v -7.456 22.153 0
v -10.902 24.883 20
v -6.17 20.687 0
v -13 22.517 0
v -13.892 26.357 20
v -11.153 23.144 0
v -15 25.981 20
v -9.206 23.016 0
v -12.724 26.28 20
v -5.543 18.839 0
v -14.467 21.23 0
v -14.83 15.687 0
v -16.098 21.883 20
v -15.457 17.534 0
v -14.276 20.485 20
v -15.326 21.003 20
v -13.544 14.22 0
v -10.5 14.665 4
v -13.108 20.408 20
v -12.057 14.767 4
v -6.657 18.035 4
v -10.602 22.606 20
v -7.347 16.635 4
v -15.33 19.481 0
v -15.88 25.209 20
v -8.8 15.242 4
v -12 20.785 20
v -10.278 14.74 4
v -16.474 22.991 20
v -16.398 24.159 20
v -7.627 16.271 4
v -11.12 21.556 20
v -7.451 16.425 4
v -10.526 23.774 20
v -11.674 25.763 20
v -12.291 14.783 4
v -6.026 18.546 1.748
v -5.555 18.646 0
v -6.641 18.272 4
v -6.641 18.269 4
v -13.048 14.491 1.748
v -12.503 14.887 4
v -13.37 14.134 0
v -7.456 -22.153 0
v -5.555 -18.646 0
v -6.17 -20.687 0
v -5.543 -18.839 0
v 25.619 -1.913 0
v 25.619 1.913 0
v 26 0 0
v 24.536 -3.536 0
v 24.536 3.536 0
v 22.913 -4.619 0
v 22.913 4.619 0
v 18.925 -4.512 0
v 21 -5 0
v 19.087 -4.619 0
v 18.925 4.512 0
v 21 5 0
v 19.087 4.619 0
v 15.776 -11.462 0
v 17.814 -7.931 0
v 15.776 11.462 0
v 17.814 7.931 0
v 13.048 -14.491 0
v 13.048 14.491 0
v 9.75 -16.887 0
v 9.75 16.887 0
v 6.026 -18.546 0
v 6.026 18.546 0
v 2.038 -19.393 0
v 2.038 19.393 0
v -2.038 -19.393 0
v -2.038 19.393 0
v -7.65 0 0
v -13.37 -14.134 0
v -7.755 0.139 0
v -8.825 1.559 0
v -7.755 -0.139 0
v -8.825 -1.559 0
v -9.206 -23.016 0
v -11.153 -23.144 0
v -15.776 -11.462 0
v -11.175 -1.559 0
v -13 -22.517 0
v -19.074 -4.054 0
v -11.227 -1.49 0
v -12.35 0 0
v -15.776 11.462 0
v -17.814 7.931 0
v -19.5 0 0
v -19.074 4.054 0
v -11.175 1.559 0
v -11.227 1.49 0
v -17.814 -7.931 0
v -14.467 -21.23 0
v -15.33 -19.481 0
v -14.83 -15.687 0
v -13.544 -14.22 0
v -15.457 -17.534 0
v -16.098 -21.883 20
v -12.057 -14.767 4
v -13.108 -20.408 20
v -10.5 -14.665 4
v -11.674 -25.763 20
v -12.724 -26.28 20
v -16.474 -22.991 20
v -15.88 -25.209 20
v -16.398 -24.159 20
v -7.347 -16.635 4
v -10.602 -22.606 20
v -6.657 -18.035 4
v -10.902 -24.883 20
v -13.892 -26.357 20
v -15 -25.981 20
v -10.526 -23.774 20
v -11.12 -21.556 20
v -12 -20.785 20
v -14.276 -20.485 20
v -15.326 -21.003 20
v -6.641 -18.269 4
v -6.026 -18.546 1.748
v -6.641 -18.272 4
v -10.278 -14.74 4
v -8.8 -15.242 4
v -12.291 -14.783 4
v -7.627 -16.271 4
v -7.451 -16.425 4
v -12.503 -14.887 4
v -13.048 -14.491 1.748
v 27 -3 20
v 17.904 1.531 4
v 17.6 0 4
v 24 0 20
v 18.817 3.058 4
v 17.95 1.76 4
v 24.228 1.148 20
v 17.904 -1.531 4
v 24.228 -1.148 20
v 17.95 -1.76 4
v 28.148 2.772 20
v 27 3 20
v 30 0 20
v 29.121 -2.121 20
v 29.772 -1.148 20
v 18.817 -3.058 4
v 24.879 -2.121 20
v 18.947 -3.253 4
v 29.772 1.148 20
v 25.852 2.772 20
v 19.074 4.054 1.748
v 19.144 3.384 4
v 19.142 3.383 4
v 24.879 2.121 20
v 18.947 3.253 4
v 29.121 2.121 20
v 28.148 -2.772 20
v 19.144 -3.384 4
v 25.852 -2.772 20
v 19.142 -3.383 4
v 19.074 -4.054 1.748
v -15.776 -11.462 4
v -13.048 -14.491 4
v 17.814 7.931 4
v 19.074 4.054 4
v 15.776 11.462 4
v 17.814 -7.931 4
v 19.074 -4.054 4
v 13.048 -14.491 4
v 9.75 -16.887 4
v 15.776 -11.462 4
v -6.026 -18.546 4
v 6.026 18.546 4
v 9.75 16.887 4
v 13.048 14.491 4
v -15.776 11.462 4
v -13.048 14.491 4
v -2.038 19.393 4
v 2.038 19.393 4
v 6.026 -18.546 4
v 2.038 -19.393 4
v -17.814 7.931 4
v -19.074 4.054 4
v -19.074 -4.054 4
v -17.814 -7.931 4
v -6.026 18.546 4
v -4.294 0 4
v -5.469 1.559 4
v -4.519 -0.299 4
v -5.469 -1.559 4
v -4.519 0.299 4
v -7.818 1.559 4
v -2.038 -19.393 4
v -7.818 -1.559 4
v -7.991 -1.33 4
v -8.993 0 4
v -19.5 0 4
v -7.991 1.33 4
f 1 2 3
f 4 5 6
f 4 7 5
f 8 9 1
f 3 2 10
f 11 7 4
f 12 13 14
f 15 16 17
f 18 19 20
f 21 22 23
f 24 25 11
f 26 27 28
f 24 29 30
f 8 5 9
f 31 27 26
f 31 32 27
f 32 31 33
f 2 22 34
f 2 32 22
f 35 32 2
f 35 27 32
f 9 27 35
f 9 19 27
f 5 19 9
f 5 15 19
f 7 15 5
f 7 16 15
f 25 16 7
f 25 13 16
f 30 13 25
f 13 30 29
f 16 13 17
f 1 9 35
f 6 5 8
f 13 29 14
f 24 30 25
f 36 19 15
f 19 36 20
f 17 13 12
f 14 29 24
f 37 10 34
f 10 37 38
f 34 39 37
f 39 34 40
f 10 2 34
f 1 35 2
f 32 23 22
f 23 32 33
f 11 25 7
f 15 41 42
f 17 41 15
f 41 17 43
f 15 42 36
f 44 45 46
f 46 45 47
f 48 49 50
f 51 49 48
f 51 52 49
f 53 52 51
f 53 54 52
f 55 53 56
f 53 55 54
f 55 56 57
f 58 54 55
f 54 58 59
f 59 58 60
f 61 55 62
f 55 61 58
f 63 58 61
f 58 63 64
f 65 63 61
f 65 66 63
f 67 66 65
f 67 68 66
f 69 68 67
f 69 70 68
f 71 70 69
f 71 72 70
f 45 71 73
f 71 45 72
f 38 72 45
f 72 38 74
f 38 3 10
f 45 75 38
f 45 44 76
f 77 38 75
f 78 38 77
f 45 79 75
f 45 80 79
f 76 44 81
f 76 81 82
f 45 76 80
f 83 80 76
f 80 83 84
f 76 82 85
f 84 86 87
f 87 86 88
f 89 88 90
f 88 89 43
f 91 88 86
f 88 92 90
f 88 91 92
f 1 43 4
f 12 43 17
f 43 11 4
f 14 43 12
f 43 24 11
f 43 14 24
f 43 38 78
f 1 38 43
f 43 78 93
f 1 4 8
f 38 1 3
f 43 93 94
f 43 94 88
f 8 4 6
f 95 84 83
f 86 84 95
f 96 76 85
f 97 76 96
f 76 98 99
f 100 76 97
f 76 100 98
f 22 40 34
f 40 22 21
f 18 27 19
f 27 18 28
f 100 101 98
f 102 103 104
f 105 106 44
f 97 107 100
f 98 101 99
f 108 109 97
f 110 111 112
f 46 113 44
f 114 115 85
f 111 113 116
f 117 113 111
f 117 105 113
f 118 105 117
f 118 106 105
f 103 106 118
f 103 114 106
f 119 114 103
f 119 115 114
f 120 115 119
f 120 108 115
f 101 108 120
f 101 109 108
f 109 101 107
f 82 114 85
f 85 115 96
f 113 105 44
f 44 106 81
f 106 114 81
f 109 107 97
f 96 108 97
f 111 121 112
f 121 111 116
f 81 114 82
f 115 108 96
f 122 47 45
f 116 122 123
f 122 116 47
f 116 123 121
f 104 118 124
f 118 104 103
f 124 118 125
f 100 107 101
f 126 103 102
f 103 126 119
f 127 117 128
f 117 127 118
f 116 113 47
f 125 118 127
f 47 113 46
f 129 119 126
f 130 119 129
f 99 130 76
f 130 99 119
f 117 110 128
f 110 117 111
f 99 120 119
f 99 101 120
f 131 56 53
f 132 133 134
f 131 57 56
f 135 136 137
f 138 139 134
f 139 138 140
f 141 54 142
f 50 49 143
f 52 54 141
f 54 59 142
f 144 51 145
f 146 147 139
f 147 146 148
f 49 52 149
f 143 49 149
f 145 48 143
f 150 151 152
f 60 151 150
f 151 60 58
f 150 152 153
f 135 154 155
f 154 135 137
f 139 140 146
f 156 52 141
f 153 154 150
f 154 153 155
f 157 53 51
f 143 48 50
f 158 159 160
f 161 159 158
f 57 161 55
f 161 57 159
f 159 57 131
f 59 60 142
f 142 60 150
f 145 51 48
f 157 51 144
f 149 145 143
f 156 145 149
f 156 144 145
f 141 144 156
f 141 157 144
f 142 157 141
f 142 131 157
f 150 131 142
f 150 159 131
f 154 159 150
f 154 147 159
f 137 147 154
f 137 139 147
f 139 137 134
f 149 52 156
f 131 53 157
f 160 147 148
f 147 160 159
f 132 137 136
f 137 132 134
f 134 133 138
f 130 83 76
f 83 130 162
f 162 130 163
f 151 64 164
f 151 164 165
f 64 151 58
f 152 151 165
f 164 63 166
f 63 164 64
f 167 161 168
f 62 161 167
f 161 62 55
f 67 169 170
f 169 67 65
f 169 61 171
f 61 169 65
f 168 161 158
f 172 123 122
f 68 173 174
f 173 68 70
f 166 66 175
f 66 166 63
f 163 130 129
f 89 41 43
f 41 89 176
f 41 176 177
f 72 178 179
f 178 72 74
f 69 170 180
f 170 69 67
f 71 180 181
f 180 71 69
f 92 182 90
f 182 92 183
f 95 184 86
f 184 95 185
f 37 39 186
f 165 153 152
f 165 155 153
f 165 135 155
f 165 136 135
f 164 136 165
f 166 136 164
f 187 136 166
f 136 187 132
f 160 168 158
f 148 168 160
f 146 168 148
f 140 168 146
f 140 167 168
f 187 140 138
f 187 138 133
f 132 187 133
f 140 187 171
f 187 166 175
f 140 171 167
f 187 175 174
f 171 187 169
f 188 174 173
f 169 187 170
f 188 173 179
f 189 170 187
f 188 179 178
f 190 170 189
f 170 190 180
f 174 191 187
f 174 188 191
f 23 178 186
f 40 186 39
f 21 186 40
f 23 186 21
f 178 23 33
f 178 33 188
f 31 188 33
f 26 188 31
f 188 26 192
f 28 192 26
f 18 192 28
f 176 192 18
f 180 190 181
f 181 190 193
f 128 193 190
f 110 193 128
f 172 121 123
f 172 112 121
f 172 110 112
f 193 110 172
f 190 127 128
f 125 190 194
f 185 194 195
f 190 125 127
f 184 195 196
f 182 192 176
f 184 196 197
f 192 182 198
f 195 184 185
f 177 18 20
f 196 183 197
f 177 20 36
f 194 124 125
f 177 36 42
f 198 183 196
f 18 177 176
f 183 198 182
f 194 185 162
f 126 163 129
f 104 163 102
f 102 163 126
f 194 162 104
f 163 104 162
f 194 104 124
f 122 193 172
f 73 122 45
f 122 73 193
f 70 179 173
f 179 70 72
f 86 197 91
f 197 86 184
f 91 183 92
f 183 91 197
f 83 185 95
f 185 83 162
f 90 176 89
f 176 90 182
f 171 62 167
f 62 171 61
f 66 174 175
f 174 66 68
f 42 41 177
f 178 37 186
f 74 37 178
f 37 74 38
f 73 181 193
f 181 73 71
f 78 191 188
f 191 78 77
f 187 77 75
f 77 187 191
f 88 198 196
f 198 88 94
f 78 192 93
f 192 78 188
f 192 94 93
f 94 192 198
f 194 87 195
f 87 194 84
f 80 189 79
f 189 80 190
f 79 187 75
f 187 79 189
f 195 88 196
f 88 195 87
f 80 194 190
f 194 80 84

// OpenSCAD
module grip(){
difference(){union(){
cylinder(r=39/2,h=4);
for(i=[0:2])rotate([0,0,30+360/3*i])translate([0,21])multmatrix([[1,0,0,0],[0,1,0.3,0],[0,0,1,0],[0,0,0,1]])cylinder(r1=5,r2=3,h=20);
}
translate([-10,0,0])rotate([0,40,0])translate([0,0,-3])cylinder(r=1.8,h=50);
}
}
%translate([70,0,0])cylinder(r=39/2,h=13);
%rotate([0,-0,0])translate([70,0,20])mirror([0,0,1])grip();
grip();
